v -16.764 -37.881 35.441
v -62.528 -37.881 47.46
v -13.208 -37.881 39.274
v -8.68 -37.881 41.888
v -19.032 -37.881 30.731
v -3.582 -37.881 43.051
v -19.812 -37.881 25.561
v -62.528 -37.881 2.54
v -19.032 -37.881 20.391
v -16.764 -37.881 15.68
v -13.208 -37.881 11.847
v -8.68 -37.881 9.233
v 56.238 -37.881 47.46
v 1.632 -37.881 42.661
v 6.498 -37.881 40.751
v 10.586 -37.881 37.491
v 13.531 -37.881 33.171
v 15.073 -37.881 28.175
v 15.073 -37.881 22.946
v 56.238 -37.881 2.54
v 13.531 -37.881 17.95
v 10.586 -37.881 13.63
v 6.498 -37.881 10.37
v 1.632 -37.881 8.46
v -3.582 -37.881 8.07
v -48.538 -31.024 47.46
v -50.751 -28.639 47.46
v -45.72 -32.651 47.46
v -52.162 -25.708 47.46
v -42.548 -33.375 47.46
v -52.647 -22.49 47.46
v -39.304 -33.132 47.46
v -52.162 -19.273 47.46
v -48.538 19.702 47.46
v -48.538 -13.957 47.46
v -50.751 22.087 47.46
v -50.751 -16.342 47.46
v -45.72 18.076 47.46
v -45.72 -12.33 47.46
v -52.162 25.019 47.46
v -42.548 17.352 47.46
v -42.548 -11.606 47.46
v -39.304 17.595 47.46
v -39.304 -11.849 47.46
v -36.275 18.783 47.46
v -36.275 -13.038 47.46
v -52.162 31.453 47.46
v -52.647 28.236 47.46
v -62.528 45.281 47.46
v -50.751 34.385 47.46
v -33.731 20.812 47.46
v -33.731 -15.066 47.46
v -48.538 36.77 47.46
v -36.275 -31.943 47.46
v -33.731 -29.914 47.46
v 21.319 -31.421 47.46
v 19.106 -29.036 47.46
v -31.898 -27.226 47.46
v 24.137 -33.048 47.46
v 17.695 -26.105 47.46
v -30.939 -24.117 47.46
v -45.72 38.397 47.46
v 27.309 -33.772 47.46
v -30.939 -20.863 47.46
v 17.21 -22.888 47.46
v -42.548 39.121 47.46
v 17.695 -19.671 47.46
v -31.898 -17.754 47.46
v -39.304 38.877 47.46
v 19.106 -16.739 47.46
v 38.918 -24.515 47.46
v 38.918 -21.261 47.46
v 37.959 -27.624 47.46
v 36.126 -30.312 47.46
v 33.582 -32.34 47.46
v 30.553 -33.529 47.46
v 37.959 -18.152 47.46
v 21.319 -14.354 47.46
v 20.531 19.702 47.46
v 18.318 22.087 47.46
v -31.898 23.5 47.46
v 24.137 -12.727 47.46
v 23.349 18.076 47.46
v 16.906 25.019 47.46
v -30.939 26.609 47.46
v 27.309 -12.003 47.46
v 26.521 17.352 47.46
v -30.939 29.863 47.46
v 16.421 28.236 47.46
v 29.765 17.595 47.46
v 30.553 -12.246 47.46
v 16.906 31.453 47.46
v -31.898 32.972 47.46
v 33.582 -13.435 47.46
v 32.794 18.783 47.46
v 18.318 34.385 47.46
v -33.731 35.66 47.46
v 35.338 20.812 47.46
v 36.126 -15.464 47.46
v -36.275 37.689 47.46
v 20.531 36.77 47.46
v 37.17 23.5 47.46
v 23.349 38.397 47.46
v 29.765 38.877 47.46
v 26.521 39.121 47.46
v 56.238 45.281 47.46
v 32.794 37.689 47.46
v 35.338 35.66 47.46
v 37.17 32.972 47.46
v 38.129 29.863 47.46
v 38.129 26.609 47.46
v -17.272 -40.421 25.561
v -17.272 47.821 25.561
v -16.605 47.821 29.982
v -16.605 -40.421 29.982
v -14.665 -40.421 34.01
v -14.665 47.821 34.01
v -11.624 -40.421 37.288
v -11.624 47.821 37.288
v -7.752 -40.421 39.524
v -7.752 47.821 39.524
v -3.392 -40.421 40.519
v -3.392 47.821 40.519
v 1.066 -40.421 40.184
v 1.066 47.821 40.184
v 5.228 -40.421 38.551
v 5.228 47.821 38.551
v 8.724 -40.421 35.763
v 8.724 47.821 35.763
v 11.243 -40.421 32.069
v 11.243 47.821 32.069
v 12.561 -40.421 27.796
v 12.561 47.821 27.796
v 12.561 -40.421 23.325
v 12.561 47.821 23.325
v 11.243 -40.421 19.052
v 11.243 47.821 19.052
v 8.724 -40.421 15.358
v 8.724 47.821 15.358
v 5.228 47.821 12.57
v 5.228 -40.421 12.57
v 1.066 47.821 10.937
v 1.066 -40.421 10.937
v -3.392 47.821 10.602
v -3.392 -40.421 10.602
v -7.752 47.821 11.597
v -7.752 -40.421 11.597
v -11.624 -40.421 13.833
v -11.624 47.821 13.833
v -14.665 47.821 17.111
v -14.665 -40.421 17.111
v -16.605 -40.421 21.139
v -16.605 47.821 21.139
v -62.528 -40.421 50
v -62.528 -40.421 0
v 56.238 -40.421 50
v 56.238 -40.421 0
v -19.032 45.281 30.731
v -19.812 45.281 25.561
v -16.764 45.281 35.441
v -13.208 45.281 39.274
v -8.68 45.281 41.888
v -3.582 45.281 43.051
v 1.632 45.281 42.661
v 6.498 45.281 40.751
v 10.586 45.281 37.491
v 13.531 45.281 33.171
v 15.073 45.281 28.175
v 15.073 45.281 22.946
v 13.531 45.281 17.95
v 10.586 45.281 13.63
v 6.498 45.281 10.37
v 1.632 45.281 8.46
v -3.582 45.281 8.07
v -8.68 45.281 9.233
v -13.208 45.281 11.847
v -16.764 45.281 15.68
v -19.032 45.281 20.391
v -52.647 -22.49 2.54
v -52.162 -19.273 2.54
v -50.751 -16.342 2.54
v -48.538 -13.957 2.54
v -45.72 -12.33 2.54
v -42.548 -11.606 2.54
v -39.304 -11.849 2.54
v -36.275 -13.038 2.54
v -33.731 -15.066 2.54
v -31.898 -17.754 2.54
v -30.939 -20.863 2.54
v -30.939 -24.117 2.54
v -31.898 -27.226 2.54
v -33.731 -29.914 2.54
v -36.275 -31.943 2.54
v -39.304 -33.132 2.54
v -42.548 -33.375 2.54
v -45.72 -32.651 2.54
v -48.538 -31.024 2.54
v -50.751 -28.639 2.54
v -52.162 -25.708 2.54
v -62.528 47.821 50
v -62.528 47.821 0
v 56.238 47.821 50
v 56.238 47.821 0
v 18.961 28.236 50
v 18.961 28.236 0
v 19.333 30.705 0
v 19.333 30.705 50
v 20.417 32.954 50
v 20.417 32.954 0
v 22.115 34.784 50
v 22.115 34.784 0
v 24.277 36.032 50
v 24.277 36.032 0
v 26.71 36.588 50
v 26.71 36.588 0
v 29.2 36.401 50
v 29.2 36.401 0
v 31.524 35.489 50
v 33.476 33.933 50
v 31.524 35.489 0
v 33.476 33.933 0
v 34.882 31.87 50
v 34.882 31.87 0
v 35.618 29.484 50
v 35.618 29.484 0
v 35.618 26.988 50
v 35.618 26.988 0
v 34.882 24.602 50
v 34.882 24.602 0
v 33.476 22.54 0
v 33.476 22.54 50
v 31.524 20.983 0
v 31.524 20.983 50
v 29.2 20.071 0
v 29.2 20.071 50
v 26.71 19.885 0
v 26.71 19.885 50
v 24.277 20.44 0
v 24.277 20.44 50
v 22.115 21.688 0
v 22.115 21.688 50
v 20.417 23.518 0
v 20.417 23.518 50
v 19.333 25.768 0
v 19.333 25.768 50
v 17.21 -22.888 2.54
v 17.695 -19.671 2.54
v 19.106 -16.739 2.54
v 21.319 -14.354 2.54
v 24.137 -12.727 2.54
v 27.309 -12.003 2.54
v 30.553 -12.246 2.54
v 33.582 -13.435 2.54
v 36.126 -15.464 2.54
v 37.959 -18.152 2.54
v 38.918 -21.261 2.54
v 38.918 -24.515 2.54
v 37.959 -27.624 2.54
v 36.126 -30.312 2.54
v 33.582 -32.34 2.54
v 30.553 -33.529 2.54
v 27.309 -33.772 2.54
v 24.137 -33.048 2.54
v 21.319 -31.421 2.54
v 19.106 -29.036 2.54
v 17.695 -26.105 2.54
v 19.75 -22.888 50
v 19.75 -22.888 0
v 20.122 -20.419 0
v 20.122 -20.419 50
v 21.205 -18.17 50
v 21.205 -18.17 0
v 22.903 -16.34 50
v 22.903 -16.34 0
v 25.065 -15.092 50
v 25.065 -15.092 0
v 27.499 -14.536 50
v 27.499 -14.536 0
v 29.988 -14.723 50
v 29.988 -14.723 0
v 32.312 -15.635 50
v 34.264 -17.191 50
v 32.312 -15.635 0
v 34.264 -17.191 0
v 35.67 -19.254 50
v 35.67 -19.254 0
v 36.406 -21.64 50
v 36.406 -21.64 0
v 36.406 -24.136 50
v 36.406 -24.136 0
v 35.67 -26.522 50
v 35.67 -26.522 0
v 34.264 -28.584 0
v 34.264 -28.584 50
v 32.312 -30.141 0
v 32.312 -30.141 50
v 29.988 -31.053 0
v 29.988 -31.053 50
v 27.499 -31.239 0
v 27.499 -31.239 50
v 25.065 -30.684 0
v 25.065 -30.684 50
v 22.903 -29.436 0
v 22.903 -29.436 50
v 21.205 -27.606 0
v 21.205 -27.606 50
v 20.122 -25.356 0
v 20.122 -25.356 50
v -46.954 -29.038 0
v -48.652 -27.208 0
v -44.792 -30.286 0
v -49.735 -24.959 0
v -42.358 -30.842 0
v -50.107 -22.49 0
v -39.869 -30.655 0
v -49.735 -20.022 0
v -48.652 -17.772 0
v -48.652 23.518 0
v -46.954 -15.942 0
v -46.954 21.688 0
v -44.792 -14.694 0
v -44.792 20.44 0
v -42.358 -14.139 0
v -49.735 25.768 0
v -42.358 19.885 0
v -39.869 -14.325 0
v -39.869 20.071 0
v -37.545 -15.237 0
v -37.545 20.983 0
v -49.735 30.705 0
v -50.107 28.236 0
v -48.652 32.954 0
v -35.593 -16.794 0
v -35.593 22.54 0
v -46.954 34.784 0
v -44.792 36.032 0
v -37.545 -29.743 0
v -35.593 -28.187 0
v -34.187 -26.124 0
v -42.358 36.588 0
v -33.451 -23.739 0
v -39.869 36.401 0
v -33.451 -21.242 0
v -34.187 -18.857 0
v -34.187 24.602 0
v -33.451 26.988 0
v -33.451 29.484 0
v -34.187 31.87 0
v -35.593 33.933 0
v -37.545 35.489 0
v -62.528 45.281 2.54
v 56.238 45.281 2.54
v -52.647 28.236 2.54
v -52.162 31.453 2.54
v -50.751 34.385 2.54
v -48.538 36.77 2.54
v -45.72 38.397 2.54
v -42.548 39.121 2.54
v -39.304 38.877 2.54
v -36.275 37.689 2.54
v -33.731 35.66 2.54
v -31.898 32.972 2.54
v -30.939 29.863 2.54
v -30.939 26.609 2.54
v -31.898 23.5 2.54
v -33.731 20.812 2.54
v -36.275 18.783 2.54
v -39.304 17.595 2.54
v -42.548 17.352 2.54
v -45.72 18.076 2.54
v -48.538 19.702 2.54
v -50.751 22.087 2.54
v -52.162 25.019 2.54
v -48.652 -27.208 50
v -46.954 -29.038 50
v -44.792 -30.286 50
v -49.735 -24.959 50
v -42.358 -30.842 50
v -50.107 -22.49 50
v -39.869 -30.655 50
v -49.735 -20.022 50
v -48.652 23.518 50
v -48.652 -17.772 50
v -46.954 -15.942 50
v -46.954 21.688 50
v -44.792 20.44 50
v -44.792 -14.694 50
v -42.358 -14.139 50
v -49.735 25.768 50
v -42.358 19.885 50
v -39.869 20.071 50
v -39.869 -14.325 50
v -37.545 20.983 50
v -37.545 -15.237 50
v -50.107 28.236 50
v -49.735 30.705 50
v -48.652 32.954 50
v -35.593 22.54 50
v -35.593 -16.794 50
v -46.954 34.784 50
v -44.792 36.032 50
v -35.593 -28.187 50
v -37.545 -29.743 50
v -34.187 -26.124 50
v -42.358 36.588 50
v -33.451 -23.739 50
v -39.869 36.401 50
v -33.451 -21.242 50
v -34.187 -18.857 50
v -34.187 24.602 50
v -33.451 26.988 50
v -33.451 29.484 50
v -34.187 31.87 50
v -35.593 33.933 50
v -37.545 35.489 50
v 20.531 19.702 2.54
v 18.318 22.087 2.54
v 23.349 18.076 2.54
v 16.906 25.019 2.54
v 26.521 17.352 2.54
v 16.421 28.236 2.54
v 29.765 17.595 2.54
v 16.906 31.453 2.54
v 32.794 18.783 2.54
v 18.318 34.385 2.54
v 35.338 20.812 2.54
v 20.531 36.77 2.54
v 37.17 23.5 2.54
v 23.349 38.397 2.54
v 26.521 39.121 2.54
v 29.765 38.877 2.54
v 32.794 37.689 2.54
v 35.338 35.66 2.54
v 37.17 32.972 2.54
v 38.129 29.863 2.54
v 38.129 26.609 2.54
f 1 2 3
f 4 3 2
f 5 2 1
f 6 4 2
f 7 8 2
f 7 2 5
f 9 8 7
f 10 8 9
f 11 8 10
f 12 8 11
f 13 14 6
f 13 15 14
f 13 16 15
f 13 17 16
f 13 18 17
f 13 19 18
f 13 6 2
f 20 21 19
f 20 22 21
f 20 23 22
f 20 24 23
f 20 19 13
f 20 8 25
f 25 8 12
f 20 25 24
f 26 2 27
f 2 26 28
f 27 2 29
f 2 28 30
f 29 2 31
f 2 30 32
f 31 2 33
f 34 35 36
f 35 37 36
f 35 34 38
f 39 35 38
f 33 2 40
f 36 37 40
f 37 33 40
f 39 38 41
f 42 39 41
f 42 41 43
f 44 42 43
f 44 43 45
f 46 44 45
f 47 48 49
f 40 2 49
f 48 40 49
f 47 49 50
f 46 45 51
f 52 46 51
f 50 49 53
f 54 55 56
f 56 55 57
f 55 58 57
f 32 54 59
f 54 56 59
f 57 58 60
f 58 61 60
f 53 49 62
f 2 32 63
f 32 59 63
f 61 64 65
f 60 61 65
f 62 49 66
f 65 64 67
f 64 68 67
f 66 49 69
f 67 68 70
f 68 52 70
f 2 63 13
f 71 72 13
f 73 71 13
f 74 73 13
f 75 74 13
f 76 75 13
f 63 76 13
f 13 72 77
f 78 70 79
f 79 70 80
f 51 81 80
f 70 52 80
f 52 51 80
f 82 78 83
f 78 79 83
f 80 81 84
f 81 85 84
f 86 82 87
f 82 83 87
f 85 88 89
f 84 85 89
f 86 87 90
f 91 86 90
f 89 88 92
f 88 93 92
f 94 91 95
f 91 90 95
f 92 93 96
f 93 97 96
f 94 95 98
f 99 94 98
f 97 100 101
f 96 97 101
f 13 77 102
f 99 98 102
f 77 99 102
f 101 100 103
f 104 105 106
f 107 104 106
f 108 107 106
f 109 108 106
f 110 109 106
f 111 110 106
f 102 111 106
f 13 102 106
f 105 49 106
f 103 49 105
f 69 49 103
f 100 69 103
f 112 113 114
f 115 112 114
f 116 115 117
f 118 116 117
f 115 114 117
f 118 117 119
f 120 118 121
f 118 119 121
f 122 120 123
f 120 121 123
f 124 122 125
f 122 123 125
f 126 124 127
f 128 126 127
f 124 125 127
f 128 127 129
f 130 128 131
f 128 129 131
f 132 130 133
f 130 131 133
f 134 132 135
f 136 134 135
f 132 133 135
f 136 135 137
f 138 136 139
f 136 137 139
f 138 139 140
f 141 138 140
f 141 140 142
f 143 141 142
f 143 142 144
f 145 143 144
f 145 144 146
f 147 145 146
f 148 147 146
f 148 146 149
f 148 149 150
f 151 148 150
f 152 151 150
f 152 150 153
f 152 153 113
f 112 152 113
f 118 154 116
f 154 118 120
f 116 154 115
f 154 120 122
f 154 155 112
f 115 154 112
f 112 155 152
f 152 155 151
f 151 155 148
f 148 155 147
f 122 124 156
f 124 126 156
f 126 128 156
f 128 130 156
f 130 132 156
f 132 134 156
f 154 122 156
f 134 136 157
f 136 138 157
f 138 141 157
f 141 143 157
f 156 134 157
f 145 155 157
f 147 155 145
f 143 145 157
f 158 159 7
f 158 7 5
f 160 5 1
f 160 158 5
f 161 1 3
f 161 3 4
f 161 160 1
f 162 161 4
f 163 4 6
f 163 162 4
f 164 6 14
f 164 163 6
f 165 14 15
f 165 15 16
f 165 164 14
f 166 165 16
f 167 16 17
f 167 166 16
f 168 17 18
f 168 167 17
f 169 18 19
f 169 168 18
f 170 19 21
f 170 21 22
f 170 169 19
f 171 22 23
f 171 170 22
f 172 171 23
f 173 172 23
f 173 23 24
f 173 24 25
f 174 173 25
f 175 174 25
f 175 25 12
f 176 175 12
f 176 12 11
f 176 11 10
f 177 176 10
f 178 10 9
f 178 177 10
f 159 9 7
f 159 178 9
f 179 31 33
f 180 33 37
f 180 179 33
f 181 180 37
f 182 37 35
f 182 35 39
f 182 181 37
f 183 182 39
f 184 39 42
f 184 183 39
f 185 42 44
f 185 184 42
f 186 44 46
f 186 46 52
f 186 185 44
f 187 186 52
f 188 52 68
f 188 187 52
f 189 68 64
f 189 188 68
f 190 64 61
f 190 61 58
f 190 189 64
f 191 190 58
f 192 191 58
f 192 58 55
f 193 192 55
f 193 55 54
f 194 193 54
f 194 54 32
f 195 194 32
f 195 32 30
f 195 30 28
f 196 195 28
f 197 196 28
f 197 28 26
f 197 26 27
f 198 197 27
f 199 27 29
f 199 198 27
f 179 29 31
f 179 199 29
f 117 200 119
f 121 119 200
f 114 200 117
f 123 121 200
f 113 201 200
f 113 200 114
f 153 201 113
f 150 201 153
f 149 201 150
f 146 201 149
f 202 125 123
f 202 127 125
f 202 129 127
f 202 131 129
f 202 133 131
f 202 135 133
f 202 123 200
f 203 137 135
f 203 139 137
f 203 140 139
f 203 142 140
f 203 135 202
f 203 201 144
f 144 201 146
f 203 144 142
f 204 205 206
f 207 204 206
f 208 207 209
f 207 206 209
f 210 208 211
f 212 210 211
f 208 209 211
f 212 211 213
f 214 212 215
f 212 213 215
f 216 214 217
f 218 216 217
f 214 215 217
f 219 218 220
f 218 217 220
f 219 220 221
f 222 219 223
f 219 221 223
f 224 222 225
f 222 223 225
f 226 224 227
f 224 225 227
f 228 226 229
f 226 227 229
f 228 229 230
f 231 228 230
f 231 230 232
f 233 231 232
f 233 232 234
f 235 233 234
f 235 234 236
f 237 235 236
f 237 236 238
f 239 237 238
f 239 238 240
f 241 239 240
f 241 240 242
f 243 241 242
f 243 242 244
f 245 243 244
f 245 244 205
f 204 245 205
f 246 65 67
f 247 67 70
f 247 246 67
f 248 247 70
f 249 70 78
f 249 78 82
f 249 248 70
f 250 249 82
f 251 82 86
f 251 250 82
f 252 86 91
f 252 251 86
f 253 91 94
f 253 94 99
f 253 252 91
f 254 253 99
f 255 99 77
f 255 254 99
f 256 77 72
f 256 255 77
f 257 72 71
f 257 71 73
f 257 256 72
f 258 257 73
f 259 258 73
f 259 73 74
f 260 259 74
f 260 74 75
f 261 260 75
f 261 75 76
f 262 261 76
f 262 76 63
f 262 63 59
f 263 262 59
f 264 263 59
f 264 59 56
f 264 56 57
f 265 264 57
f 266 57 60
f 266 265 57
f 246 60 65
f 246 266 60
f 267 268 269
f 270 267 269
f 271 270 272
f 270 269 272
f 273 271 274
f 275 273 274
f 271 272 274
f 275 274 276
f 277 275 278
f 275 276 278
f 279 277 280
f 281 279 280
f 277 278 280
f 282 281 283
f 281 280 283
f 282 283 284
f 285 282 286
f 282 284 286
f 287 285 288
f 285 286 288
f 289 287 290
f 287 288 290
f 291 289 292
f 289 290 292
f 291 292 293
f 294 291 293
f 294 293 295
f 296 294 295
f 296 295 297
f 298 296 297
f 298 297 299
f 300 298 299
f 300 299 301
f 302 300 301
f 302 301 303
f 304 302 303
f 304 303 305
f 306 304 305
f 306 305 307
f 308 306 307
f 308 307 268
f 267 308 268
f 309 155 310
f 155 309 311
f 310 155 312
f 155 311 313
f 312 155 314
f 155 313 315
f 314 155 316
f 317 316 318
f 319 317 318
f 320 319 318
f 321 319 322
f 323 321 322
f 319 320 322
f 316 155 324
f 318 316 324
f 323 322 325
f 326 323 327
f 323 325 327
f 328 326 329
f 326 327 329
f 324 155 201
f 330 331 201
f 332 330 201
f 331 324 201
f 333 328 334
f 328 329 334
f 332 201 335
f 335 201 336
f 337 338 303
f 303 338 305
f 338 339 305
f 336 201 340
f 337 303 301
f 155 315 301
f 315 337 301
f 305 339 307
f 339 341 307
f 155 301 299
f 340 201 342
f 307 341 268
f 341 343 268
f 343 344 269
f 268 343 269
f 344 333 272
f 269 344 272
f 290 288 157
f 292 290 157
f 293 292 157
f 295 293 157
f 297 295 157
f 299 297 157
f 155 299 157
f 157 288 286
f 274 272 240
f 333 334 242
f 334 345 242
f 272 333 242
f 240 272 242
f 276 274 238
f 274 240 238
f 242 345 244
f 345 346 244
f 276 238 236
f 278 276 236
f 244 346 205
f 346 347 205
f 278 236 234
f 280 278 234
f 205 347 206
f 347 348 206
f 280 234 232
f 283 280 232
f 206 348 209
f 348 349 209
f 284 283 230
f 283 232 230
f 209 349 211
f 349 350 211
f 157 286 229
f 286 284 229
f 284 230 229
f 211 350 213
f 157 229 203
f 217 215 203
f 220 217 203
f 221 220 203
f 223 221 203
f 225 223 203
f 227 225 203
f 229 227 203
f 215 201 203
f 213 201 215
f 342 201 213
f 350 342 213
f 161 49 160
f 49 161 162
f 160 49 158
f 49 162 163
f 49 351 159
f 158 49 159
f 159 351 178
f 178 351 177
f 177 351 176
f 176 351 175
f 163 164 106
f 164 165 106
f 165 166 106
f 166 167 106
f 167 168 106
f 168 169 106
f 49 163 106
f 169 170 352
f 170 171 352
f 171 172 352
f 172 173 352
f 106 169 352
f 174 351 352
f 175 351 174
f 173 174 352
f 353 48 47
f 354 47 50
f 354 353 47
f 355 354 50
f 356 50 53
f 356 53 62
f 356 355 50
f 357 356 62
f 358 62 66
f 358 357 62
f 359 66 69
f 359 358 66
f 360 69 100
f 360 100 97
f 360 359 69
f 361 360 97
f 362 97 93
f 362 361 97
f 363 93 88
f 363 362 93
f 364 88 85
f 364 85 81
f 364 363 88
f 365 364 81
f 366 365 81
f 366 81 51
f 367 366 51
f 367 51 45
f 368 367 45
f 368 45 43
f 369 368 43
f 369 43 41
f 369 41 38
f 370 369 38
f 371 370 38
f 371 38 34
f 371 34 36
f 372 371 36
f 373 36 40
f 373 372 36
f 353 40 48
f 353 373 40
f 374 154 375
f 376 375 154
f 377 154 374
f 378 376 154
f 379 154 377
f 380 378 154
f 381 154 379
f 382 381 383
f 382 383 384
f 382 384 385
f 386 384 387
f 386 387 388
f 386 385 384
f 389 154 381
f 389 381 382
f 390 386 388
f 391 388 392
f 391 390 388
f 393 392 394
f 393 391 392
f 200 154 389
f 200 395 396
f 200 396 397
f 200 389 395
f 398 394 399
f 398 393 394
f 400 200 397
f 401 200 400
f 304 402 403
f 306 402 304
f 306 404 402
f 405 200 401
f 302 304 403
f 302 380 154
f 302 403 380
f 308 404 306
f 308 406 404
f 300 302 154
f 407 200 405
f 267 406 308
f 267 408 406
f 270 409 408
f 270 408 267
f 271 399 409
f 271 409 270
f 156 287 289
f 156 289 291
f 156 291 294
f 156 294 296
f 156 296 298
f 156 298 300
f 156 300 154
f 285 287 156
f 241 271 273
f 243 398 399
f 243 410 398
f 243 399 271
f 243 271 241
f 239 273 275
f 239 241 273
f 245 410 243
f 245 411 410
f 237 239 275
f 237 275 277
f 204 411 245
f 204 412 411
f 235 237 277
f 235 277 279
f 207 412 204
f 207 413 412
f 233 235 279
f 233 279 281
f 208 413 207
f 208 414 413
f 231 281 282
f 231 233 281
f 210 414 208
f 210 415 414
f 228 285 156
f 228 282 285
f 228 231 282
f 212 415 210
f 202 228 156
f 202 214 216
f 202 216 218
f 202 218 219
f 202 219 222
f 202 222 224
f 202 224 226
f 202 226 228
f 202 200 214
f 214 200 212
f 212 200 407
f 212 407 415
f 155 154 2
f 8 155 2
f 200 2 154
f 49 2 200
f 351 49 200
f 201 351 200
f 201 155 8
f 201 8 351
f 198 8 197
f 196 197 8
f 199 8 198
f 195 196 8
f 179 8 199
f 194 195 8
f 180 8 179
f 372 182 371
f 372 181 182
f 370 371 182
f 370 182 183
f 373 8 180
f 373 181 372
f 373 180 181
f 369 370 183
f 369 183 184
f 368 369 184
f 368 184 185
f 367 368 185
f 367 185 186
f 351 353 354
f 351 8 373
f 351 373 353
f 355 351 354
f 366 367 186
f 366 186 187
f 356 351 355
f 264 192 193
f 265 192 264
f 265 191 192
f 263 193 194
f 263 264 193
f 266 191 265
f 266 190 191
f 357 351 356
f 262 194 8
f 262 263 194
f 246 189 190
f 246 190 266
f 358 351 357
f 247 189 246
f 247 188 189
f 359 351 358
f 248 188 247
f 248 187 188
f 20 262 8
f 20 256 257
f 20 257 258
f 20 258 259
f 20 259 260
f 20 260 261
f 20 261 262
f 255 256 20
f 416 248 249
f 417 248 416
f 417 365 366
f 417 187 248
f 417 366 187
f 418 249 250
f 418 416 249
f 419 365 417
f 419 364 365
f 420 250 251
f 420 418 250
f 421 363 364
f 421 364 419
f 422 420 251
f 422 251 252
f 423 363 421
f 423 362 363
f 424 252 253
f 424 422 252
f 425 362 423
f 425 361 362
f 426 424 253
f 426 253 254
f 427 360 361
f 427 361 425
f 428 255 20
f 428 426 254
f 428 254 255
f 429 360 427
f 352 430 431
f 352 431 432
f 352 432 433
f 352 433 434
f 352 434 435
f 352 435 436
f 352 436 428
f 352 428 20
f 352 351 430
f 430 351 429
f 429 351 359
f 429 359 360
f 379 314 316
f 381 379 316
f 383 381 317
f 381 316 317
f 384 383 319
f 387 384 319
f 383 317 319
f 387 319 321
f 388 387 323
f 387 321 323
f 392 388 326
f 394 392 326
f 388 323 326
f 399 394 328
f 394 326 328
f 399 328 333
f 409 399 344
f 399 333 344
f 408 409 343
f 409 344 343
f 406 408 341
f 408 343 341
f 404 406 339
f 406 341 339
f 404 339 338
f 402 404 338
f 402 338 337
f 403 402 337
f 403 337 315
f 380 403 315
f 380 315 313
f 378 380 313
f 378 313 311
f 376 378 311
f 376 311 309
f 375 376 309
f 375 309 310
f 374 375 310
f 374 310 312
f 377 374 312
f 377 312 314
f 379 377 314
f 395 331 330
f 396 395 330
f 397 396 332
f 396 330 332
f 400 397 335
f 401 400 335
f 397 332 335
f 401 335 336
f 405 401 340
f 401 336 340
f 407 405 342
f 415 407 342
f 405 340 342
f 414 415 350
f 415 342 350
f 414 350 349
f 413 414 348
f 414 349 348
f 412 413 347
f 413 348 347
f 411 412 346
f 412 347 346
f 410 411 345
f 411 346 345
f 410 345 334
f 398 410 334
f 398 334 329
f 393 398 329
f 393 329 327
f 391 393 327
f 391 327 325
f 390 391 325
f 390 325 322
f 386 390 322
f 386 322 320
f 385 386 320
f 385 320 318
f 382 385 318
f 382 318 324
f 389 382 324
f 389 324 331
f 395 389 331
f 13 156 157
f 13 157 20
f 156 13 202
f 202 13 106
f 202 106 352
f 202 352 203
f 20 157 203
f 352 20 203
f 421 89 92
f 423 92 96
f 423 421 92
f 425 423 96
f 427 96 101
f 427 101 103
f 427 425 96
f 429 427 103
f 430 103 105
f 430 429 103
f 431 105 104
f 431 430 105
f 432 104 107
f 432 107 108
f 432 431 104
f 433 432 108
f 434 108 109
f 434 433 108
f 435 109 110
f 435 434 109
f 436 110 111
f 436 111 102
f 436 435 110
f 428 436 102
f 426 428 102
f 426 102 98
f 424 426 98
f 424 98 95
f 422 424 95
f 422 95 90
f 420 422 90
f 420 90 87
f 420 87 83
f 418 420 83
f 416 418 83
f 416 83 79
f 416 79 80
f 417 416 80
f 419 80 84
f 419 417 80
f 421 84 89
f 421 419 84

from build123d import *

# Parameters (mm, degrees)
F0_W     = 118.7662929296
F0_H     = 88.2422402501
F1_DEPTH = 50
F3_D     = 16.75
F5_D     = 30
F6_T     = -2.54


with BuildPart() as f1:
    # F0 (on Top) → F1 (new body)
    with BuildSketch(Plane.XY):
        with Locations((-3.1449049711, 3.6998838186)):
            Rectangle(F0_W, F0_H)
    extrude(amount=F1_DEPTH)

    # F3 (through all)
    with Locations(Plane.XY.offset(50)):
        with Locations((-41.7324155569, 28.2360911369), (27.3362733424, 28.2360911369), (28.1245876104, -22.8877589107), (-41.7324155569, -22.4902890623)):
            Hole(F3_D / 2)

    # F5 (through all)
    with Locations(Plane.XZ.offset(40.4212363064)):
        with Locations((-2.2715097293, 25.5605392158)):
            Hole(F5_D / 2)

    # F6
    f6_openings = [f1.faces().sort_by_distance(p)[0] for p in [
        (56.238241, 3.699884, 25),
        (-62.528051, 3.699884, 25),
    ]]
    offset(amount=F6_T, openings=f6_openings)


solid = f1.part
